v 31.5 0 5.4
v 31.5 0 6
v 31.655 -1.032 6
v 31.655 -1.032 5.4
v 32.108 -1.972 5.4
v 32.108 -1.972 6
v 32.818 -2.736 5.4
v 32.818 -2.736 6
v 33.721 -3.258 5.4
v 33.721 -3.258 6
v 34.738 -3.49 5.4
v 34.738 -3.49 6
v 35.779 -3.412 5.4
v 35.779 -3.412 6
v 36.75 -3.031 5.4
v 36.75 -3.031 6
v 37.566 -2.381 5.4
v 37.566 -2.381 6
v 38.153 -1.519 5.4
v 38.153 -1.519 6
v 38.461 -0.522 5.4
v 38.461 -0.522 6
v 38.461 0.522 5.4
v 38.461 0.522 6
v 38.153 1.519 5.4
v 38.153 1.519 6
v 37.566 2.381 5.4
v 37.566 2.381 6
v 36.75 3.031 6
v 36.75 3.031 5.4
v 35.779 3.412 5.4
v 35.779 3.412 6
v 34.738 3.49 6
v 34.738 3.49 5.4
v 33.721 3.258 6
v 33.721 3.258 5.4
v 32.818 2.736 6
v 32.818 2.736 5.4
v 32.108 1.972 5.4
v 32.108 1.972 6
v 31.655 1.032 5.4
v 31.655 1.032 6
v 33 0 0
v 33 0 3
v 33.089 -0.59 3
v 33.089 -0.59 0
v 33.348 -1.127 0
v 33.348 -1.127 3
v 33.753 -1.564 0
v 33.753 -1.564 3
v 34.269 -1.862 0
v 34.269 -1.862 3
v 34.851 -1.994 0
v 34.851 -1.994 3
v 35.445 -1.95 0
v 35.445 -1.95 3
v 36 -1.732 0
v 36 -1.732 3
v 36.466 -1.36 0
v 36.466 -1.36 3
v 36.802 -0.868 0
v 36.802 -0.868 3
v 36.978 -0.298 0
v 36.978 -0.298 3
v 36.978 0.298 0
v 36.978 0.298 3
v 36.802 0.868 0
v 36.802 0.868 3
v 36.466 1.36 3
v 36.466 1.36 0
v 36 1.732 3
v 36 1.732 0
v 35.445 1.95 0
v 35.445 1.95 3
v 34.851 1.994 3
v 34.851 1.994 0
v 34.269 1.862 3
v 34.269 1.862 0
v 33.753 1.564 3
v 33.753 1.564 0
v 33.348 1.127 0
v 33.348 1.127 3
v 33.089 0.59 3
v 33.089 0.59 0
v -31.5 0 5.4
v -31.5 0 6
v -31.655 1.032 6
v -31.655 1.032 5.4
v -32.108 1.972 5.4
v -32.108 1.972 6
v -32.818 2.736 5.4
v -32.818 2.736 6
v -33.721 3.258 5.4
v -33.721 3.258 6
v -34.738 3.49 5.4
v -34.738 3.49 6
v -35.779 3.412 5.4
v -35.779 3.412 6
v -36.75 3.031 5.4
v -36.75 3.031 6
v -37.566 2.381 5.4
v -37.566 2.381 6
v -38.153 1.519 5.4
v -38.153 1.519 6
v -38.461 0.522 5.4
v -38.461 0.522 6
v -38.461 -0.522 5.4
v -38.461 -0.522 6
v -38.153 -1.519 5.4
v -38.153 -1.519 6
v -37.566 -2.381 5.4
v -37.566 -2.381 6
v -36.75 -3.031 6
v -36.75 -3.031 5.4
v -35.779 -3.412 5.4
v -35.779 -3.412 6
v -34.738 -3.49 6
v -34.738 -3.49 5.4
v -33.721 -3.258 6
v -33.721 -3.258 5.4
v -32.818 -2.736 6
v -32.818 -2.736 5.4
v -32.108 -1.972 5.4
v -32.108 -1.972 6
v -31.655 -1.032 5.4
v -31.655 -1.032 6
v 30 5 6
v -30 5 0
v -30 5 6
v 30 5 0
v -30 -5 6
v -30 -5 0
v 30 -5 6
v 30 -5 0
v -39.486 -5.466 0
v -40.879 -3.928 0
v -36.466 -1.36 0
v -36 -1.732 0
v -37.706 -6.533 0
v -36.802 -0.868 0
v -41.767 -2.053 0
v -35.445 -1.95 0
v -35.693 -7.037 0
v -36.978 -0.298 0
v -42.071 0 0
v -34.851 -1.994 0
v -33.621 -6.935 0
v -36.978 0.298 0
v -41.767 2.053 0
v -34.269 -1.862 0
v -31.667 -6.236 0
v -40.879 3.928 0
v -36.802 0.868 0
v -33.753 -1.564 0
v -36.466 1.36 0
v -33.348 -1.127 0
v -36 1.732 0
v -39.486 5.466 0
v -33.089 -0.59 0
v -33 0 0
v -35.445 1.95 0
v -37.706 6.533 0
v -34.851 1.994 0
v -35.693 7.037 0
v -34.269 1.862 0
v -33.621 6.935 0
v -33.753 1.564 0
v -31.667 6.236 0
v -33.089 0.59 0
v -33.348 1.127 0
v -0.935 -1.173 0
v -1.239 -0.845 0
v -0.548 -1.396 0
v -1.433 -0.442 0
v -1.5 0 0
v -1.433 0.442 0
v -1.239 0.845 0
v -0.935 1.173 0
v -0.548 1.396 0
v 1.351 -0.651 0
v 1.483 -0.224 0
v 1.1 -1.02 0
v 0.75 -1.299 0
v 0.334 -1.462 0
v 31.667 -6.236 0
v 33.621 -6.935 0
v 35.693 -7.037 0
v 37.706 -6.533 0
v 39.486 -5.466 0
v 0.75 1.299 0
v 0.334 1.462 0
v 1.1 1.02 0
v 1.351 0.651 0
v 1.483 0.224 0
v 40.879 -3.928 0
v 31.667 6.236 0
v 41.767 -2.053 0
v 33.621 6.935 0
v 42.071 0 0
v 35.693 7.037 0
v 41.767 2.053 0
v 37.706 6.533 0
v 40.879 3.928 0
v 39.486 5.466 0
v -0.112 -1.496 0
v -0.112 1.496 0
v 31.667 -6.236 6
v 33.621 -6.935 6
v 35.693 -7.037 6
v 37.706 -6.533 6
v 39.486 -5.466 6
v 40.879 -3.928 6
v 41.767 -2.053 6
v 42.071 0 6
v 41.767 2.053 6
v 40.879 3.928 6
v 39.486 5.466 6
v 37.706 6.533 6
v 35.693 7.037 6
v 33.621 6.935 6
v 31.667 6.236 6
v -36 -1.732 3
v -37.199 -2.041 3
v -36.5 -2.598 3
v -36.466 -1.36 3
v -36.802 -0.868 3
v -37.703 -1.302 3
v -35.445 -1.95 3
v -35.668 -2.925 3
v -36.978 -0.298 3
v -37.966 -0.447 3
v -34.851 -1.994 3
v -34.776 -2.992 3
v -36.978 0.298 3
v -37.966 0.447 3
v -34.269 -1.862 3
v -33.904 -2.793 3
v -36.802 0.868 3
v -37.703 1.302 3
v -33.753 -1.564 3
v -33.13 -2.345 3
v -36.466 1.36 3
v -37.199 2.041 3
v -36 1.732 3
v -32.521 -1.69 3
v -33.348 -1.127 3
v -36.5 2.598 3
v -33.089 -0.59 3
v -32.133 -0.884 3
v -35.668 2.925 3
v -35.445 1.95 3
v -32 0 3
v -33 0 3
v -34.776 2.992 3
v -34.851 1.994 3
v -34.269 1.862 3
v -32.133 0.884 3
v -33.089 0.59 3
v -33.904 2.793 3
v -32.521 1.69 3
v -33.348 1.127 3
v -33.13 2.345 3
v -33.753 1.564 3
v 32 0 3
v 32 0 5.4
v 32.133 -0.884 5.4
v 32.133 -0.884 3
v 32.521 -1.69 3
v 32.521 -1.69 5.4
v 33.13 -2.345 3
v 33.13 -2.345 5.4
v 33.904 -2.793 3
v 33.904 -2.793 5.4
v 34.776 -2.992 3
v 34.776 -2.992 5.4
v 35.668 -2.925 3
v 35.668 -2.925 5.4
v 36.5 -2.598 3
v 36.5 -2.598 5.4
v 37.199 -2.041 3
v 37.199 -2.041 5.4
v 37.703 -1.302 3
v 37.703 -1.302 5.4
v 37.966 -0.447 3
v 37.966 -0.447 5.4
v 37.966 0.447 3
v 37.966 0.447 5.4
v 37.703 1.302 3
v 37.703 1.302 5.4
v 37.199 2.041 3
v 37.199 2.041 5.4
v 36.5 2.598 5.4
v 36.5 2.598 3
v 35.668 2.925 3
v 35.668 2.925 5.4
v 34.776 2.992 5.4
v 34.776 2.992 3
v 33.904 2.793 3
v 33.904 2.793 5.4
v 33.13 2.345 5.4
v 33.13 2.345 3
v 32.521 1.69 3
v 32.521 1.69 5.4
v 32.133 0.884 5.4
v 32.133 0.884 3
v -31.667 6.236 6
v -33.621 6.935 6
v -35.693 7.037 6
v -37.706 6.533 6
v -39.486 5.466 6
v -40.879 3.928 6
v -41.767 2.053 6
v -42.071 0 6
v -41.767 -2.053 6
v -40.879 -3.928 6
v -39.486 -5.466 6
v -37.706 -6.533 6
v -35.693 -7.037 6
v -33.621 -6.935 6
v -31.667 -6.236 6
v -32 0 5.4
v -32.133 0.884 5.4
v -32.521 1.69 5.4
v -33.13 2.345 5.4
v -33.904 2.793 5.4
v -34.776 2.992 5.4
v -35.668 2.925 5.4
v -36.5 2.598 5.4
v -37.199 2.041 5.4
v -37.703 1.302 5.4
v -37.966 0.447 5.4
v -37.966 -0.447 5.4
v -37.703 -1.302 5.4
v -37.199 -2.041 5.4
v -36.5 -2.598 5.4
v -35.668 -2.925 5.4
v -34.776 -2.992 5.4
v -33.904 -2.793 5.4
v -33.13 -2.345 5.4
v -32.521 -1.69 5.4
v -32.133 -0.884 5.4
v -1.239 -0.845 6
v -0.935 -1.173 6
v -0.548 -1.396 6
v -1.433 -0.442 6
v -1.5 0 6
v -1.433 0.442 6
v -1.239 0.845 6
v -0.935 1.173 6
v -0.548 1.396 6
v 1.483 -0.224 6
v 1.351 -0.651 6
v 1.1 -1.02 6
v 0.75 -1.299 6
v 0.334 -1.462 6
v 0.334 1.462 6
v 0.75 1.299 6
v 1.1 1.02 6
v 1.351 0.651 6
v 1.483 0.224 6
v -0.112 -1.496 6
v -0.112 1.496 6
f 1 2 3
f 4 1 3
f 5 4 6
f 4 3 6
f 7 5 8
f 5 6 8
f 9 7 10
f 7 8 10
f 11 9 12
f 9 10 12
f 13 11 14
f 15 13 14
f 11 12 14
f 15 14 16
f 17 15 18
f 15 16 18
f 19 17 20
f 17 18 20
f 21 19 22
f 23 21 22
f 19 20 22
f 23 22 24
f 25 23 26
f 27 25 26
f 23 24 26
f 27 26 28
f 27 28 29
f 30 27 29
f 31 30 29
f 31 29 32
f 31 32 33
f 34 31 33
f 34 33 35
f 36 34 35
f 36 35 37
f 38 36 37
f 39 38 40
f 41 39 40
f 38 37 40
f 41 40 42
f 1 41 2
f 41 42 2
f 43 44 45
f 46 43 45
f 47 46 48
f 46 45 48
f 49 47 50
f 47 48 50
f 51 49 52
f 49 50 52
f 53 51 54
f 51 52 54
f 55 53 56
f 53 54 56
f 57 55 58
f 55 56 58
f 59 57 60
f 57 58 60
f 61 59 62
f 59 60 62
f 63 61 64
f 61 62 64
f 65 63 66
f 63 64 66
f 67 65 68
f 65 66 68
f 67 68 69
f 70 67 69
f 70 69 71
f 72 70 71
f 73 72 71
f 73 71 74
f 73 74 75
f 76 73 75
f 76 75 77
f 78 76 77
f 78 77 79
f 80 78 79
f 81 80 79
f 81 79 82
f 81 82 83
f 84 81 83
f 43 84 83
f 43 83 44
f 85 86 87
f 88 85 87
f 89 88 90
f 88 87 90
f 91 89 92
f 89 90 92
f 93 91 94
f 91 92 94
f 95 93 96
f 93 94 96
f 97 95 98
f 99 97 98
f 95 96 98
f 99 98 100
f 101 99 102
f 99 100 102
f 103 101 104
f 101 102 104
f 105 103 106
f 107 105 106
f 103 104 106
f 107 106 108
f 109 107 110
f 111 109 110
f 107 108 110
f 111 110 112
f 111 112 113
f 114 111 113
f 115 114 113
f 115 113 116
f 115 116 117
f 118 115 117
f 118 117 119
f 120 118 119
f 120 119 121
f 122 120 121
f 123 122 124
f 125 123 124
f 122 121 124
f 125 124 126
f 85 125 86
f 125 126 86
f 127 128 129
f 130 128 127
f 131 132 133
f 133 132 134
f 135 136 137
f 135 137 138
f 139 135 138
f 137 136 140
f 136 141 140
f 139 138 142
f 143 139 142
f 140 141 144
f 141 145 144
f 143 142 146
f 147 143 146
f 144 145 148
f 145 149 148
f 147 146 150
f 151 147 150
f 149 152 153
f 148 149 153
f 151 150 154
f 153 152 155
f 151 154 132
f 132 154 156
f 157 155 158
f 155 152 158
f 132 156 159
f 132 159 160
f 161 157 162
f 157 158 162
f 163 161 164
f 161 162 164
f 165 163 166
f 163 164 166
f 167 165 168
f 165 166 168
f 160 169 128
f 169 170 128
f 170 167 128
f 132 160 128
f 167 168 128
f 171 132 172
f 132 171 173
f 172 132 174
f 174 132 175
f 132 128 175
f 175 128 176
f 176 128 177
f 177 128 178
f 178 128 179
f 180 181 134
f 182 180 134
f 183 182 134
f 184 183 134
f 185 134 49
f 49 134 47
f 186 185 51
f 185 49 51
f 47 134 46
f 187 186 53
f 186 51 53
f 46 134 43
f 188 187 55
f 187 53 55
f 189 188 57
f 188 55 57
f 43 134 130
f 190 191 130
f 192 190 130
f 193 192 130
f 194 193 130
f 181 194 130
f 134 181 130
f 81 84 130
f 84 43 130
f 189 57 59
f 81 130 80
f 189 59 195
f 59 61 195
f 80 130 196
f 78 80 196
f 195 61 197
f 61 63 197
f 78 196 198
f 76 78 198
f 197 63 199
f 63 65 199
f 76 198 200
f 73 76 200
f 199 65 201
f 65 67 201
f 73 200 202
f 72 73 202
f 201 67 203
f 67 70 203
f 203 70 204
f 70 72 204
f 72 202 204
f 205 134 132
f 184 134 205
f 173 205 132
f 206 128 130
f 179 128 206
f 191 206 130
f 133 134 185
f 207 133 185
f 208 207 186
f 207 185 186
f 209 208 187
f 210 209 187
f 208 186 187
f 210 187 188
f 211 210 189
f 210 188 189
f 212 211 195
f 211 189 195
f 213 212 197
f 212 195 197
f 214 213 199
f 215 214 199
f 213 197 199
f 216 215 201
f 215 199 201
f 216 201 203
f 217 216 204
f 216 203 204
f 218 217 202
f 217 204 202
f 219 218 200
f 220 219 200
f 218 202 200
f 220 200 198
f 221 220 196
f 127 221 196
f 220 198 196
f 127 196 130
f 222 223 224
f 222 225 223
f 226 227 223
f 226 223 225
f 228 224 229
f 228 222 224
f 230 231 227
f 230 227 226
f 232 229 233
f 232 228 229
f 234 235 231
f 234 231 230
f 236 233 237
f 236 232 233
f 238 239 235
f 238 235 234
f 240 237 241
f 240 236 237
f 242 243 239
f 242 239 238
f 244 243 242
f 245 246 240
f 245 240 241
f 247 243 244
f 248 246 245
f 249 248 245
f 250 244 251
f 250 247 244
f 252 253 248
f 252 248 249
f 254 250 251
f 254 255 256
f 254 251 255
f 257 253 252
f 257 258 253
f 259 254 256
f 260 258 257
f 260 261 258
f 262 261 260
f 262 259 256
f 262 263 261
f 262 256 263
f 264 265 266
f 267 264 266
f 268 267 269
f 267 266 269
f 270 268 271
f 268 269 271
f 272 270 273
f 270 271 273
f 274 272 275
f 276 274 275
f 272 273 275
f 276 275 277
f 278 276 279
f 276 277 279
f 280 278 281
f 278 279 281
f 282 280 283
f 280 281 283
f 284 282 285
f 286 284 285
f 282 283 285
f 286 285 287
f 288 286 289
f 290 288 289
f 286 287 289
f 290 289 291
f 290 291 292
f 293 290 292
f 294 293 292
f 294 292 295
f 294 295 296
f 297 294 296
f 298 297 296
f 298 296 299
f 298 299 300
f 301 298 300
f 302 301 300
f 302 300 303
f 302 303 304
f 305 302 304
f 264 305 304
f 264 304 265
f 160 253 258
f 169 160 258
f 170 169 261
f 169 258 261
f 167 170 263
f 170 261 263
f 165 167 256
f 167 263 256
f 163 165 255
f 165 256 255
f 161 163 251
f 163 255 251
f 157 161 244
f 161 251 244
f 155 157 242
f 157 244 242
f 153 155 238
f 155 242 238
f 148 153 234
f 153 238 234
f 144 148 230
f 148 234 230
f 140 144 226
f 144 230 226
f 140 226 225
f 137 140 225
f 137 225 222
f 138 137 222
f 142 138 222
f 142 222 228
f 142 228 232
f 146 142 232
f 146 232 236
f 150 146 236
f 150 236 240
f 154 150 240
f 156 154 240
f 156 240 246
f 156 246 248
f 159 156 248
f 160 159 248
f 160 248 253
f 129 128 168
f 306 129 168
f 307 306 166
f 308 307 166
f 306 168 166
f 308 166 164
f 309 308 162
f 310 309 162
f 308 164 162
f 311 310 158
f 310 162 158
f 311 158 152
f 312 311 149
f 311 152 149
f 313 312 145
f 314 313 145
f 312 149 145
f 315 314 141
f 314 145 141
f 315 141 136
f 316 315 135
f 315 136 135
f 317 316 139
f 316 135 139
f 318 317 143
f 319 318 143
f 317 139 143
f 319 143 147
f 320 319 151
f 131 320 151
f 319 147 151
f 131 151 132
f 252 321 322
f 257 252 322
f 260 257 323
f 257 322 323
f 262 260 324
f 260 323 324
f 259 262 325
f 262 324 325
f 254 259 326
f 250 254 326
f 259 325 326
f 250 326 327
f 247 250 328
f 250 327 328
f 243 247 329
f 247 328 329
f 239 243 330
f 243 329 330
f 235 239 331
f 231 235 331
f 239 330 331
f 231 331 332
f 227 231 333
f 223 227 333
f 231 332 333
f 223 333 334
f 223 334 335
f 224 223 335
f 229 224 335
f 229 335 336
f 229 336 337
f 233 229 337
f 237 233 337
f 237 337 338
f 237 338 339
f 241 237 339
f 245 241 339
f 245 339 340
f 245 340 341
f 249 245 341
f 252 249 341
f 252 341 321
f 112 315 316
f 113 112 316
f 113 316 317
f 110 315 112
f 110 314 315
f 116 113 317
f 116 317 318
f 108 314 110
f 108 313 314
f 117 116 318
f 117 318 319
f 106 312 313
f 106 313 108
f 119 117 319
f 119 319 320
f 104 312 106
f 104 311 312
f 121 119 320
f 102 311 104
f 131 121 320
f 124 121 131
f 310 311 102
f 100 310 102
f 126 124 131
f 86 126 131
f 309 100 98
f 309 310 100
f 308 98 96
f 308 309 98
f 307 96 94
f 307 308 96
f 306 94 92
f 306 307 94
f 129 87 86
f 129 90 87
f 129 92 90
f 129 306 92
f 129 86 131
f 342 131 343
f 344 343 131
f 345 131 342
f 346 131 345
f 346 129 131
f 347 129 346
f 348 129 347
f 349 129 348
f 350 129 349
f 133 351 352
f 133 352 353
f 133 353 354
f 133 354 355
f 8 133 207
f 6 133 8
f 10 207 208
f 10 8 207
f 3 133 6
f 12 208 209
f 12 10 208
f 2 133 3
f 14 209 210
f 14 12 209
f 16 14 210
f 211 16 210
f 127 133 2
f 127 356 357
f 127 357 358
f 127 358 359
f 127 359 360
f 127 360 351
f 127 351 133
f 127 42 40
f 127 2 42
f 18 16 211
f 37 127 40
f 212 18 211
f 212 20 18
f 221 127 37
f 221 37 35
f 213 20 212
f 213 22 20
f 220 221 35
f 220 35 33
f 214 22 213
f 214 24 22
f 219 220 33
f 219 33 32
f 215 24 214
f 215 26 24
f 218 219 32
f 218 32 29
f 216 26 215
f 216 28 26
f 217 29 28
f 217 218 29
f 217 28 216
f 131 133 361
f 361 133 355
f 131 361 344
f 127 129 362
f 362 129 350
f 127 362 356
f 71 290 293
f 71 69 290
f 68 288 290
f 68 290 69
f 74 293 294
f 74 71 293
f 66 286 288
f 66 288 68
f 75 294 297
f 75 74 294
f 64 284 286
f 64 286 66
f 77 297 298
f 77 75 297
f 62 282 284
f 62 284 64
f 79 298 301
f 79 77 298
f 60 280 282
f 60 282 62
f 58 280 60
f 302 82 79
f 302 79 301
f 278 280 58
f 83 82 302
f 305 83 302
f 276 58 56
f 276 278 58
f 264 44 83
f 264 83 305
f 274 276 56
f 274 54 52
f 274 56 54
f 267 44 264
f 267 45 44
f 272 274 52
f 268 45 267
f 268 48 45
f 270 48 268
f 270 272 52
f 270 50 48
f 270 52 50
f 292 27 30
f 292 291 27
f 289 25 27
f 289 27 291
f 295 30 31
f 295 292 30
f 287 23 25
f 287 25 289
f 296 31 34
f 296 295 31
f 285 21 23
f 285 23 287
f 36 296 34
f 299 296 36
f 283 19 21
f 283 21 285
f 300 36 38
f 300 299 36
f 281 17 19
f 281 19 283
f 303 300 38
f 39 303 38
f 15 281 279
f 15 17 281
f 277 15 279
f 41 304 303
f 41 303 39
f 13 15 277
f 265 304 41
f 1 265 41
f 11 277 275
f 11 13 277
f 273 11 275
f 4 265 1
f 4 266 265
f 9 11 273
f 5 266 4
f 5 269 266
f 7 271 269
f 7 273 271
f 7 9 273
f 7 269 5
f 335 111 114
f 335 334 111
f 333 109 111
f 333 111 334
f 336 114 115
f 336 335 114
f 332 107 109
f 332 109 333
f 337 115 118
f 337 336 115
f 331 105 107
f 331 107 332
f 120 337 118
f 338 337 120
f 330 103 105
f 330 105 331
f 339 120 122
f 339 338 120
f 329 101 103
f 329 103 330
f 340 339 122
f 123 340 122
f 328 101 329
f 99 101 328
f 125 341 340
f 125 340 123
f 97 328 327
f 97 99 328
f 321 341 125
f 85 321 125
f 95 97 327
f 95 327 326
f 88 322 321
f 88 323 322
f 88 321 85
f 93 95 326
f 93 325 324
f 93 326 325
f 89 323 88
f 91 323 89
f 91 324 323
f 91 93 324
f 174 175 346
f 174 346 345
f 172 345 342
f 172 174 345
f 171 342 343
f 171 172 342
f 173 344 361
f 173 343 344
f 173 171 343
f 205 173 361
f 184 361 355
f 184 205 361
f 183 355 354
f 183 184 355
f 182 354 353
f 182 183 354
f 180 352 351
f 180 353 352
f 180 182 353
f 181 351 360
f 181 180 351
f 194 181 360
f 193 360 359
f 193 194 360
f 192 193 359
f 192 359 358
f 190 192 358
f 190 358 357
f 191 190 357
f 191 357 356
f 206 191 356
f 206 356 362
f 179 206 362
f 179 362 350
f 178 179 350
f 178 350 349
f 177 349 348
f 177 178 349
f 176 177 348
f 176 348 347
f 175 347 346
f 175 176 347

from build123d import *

# Parameters (mm, degrees)
SKETCH1_R               = 7.071067812
SKETCH1_R_2             = 3
SKETCH1_W               = 80
SKETCH1_H               = 10
BOSS_EXTRUDE1_DEPTH     = 6
SKETCH2_R               = 3
CUT_EXTRUDE1_DEPTH      = 3
SKETCH3_R               = 2
CUT_EXTRUDE2_DEPTH      = 44.081025369
SKETCH4_R               = 3.5
CUT_EXTRUDE3_DEPTH      = 0.6
CUT_EXTRUDE4_DEPTH      = 24
CUT_EXTRUDE4_DEPTH_BACK = 44.081025369
SKETCH5_R               = 1.5


with BuildPart() as part:
    # Sketch1 → Boss-Extrude1 (new body)
    with BuildSketch(Plane.XY):
        with Locations((-35, 0)):
            Circle(SKETCH1_R)
        with Locations((-35, 0)):
            Circle(SKETCH1_R_2)
        with Locations((35, 0)):
            Circle(SKETCH1_R)
        with Locations((35, 0)):
            Circle(SKETCH1_R_2)
        Rectangle(SKETCH1_W, SKETCH1_H)
    extrude(amount=BOSS_EXTRUDE1_DEPTH)

    # Sketch2 → Cut-Extrude1 (cut)
    with BuildSketch(Plane.XY.offset(6)):
        with Locations((-35, 0)):
            Circle(SKETCH2_R)
        with Locations((35, 0)):
            Circle(SKETCH2_R)
    extrude(amount=-CUT_EXTRUDE1_DEPTH, mode=Mode.SUBTRACT)

    # Sketch3 → Cut-Extrude2 (cut, through all)
    with BuildSketch(Plane.XY.offset(6)):
        with Locations((-35, 0)):
            Circle(SKETCH3_R)
        with Locations((35, 0)):
            Circle(SKETCH3_R)
    extrude(amount=-CUT_EXTRUDE2_DEPTH, mode=Mode.SUBTRACT)

    # Sketch4 → Cut-Extrude3 (cut)
    with BuildSketch(Plane.XY.offset(6)):
        with Locations((-35, 0)):
            Circle(SKETCH4_R)
        with Locations((35, 0)):
            Circle(SKETCH4_R)
    extrude(amount=-CUT_EXTRUDE3_DEPTH, mode=Mode.SUBTRACT)

    # Sketch5 → Cut-Extrude4 (cut, two sides: drawn at the far end of the back side and taken through both)
    with BuildSketch(Plane.XY.offset(6).offset(-CUT_EXTRUDE4_DEPTH_BACK)):
        Circle(SKETCH5_R)
    extrude(amount=CUT_EXTRUDE4_DEPTH + CUT_EXTRUDE4_DEPTH_BACK, mode=Mode.SUBTRACT)


solid = part.part
